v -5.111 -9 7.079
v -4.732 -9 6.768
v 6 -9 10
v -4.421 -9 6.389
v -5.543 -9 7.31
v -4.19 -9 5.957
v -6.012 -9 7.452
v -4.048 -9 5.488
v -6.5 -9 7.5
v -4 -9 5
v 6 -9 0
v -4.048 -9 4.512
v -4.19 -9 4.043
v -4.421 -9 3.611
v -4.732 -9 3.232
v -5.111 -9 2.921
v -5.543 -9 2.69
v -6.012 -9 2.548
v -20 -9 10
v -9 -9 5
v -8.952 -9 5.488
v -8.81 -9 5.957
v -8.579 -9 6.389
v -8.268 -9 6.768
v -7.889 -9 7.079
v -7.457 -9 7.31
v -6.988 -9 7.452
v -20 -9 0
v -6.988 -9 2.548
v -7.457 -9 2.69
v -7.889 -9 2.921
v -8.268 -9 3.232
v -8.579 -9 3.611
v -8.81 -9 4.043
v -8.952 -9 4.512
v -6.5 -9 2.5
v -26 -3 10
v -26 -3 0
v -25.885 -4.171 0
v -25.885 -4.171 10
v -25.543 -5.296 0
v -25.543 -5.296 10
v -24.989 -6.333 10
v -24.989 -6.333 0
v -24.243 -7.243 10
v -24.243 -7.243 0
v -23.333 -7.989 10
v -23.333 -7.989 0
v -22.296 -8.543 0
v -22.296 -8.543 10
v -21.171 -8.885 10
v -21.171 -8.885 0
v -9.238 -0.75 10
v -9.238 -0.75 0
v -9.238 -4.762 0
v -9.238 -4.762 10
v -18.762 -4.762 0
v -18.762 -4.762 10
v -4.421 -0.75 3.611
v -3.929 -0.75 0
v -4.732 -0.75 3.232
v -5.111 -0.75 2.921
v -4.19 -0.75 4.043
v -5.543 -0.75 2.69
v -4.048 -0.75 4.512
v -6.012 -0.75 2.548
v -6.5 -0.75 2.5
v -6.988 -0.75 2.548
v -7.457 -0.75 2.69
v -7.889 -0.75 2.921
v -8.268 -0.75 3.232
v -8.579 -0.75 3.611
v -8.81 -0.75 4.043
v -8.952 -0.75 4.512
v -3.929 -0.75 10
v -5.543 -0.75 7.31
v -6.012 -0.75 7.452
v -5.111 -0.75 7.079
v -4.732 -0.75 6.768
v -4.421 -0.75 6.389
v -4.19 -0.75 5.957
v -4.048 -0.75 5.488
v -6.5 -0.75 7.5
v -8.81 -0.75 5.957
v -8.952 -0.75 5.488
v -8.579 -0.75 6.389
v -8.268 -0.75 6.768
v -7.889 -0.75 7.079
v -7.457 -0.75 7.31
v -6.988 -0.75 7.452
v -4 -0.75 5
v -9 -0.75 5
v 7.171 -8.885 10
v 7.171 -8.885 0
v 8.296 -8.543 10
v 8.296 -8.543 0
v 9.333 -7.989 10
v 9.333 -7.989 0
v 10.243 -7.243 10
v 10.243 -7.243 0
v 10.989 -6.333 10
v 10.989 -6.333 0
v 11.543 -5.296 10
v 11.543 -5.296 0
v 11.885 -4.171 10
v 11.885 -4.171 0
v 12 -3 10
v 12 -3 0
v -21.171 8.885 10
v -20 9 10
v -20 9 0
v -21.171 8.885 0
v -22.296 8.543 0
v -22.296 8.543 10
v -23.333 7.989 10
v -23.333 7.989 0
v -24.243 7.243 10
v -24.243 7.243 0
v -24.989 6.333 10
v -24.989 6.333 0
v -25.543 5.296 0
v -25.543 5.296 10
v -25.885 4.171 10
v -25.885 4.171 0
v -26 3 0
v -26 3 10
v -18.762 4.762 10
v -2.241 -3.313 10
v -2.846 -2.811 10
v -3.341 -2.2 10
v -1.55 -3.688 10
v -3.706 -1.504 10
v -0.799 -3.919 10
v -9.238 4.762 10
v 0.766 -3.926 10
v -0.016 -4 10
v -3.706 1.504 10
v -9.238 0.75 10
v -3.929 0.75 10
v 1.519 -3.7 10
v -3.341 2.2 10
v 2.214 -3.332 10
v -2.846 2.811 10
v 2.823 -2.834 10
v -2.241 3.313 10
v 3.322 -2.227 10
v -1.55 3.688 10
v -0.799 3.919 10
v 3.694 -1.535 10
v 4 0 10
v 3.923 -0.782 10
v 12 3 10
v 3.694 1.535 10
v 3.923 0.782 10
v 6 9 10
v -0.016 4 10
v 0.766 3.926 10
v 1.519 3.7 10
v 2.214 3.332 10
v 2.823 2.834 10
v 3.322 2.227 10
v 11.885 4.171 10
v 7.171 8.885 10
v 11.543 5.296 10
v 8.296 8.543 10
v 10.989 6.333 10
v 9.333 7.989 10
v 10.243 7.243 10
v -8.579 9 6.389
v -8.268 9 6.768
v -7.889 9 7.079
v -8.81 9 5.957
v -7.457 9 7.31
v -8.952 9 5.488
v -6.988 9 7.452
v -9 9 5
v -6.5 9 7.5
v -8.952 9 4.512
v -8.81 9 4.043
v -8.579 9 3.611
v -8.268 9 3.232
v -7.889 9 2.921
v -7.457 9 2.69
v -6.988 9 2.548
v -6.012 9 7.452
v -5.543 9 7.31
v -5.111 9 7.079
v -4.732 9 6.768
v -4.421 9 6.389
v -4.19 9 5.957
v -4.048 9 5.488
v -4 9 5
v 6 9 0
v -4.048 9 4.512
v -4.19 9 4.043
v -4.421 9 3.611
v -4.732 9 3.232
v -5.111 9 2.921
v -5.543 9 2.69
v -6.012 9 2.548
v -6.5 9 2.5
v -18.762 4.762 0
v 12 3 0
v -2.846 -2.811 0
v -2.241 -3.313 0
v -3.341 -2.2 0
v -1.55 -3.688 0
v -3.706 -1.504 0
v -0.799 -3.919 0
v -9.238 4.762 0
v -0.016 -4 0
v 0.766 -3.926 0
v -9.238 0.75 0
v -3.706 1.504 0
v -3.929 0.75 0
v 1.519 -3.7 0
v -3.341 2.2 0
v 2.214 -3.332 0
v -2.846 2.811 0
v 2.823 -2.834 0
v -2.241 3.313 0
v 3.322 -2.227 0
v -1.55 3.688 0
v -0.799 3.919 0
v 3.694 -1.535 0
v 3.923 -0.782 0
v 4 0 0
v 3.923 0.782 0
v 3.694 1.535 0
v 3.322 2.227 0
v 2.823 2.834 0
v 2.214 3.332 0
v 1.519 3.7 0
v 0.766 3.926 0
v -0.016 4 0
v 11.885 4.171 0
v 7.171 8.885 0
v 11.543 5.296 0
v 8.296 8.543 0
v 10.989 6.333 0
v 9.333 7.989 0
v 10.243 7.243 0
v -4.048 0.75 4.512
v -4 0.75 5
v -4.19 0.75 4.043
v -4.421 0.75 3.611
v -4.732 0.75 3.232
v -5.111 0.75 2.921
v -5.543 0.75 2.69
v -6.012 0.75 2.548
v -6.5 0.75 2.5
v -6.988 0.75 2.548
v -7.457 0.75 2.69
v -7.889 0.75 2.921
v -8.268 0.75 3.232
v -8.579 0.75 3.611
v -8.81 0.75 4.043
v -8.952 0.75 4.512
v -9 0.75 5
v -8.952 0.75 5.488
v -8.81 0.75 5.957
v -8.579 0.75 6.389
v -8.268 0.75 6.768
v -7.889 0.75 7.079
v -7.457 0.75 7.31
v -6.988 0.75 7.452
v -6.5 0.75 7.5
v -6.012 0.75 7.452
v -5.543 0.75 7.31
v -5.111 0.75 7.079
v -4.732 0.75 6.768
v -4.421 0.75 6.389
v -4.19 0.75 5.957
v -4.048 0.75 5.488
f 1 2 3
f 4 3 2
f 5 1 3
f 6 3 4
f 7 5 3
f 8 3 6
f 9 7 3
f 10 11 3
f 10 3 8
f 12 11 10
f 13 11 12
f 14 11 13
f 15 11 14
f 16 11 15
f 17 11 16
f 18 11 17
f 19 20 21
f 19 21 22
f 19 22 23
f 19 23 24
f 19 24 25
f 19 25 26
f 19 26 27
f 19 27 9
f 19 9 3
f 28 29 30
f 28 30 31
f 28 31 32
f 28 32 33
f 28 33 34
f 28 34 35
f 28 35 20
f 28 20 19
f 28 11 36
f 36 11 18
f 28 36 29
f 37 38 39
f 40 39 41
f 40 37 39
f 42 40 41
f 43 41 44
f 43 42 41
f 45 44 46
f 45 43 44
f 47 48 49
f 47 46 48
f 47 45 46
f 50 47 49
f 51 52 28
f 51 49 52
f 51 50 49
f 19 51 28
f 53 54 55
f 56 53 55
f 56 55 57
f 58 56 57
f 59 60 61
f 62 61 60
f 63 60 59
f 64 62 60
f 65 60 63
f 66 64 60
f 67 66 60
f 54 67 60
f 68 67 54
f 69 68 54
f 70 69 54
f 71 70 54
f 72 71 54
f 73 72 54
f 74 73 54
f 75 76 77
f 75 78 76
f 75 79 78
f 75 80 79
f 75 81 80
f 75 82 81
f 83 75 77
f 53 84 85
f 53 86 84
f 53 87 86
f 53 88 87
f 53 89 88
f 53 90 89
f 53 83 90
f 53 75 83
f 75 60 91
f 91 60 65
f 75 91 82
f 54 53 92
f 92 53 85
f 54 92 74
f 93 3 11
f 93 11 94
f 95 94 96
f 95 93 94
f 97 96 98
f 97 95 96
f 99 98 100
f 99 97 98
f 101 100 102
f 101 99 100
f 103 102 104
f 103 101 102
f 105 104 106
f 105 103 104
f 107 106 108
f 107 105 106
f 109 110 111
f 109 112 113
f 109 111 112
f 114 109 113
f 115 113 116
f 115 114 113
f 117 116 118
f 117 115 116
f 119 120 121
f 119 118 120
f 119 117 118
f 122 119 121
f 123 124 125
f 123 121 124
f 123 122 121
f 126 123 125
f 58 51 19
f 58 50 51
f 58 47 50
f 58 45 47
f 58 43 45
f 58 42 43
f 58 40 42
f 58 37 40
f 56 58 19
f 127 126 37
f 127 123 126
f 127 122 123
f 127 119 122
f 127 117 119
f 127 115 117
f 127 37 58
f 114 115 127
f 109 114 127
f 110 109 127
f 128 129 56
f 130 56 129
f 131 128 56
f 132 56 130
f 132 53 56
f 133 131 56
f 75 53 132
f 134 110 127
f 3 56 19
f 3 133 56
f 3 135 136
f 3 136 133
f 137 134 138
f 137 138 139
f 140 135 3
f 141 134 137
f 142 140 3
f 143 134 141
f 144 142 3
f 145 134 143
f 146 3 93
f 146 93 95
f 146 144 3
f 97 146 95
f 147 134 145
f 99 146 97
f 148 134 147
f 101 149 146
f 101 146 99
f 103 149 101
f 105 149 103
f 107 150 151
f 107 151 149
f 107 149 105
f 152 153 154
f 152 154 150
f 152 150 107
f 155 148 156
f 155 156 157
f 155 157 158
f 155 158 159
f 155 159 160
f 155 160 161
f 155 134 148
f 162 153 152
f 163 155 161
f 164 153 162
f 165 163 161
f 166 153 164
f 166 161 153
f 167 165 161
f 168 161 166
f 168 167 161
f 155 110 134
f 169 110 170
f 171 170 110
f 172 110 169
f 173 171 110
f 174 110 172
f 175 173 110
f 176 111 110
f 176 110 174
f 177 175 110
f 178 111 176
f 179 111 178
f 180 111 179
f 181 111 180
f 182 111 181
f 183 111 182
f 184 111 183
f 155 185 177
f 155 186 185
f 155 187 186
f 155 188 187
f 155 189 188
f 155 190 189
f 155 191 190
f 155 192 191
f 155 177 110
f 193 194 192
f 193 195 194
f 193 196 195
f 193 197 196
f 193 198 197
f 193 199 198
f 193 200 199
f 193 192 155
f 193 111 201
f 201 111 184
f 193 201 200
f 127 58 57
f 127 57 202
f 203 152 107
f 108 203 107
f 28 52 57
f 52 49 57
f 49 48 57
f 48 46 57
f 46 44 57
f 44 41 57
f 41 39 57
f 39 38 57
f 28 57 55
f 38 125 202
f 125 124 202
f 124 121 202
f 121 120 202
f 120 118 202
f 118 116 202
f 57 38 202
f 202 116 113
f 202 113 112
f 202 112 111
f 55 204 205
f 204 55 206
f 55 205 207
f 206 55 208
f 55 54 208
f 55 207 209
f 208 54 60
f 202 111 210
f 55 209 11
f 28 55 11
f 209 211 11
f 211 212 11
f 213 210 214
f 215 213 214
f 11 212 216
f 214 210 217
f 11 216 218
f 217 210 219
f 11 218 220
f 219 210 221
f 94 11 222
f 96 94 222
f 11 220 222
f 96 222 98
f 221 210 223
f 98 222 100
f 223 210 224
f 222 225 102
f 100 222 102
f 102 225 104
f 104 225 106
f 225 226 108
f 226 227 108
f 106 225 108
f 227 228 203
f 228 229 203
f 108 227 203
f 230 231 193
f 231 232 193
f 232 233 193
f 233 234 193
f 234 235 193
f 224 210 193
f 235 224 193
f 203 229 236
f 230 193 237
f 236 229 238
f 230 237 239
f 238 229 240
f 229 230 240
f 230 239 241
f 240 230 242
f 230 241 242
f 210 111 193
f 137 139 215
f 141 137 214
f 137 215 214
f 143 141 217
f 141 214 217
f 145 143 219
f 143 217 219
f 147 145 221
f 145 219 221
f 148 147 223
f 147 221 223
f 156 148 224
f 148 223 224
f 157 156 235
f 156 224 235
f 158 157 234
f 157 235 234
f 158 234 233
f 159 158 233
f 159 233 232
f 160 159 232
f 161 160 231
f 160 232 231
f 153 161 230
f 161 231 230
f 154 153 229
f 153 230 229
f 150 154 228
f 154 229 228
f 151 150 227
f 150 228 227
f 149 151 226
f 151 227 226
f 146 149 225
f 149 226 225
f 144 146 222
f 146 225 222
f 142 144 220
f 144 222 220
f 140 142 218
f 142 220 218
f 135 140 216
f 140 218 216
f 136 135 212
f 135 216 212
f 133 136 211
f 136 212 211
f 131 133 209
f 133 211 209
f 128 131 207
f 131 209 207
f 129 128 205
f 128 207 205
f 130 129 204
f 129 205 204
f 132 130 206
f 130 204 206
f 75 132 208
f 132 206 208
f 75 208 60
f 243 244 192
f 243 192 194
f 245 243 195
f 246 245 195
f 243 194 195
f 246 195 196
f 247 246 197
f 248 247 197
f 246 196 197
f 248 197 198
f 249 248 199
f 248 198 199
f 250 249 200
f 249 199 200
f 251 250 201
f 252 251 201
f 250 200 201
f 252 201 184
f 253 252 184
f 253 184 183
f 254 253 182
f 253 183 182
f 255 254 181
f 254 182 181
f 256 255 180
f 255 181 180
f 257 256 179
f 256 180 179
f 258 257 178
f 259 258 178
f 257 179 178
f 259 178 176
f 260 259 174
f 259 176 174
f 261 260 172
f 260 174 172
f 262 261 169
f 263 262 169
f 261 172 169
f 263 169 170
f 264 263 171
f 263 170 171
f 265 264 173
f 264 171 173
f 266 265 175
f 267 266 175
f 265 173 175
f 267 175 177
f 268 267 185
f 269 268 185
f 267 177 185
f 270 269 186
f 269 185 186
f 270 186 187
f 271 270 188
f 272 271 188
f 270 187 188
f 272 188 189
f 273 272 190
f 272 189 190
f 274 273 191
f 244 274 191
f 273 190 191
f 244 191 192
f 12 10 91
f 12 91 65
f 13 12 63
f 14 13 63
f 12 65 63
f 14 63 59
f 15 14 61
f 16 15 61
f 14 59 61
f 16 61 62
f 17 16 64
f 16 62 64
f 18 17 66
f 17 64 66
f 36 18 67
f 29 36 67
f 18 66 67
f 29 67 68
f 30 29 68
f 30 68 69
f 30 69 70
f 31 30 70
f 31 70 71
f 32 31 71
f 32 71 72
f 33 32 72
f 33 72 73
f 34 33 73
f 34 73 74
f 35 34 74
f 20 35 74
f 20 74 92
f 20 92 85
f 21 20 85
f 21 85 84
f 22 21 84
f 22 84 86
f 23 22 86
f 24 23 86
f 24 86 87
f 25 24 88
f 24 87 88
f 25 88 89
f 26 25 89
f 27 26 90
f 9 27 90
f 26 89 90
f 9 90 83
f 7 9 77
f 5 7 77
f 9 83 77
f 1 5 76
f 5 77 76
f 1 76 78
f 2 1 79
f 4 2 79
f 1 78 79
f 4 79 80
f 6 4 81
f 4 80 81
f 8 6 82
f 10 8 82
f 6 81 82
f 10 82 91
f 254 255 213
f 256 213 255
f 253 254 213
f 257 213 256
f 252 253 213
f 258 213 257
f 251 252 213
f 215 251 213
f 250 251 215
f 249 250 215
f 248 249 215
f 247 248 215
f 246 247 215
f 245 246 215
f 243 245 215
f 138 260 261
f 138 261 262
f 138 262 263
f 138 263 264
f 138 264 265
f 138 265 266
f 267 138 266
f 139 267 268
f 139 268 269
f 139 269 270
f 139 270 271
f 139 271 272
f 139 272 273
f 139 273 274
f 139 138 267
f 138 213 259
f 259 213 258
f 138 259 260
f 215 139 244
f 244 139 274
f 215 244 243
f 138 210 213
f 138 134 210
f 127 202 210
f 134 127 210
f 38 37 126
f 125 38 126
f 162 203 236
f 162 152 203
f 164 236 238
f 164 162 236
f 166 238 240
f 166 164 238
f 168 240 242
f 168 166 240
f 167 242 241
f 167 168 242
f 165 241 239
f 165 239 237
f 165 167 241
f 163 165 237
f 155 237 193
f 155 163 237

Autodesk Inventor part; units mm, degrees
ref_plane "YZ Plane" through (0, 0, 0) normal (1, 0, 0) x (0, 1, 0)
ref_plane "XZ Plane" through (0, 0, 0) normal (0, 1, 0) x (-1, 0, 0)
ref_plane "XY Plane" through (0, 0, 0) normal (0, 0, 1) x (1, 0, 0)
sketch "Sketch1" plane through (0, 0, 0) normal (0, 0, 1) x (1, 0, 0)
  line L0 (0, 0) -> (-14, 0) construction
  circle A0 centre (-14, 0) radius 4
  circle A1 centre (0, 0) radius 4
  line L1 (12, -9) -> (-26, -9)
  line L2 (-26, -9) -> (-26, 9)
  line L3 (-26, 9) -> (12, 9)
  line L4 (12, 9) -> (12, -9)
  line L5 (12, -9) -> (-26, 9) construction
  line L6 (-26, -9) -> (12, 9) construction
  point P0 (-7, 0)
  dimension "d0" = 8
  dimension "d1" = 14
  dimension "d2" = 12
  dimension "d3" = 18
  dimension "d13" = 38
extrude "Extrusion1" add sketch "Sketch1" along normal blind 10
sketch "Sketch2" plane through (-26, 9, 0) normal (0, 1, 0) x (1, 0, 0)
  circle A0 centre (19.5, -5) radius 2.5
  line L0 (19.5, -5) -> (0, -5) construction
  line L1 (0, 0) -> (0, -10) construction
  point P0 (26, 0)
  dimension "d6" = 5
  dimension "d17" = 19.5
extrude "Extrusion2" cut sketch "Sketch2" against normal through all
fillet "Fillet1" radius 6 4 edges at (12, 9, 5) (-26, 9, 5) (-26, -9, 5) (12, -9, 5)
sketch "Sketch3" plane through (0, 0, 10) normal (0, 0, 1) x (1, 0, 0)
  line L0 (-20, -9) -> (6, -9) projected
  circle A0 centre (0, 0) radius 4 projected
  circle A1 centre (-14, 0) radius 4 projected
  line L1 (-14, 0) -> (0, 0) construction
  line L2 (0, -0.75) -> (-14, -0.75)
  line L3 (-14, -0.75) -> (-14, 0.75)
  line L4 (-14, 0.75) -> (0, 0.75)
  line L5 (0, 0.75) -> (0, -0.75)
  line L6 (0, -0.75) -> (-14, 0.75) construction
  line L7 (-14, -0.75) -> (0, 0.75) construction
  point P0 (-7, 0)
  dimension "d10" = 1.5
extrude "Extrusion3" cut sketch "Sketch3" against normal through all contours L4 L5 L2 A0 | A0 L2 A1 L4 | A1 L2 L3 L4 picked at (-1.3307, -0.0838) picked at (-12.6667, 0)
sketch "Sketch4" plane through (0, 0, 10) normal (0, 0, 1) x (1, 0, 0)
  line L0 (-10.0709, 0.75) -> (-3.9291, 0.75) construction
  arc A0 (-3.9291, -0.75) -> (-3.9291, 0.75) centre (0, 0) ccw construction
  line L1 (-3.9291, -0.75) -> (-10.0709, -0.75) construction
  arc A1 (-10.0709, 0.75) -> (-10.0709, -0.75) centre (-14, 0) ccw construction
  arc A2 (6, -9) -> (12, -3) centre (6, -3) ccw construction
  line L2 (12, -3) -> (12, 3) construction
  arc A3 (12, 3) -> (6, 9) centre (6, 3) ccw construction
  line L3 (6, 9) -> (-20, 9) construction
  arc A4 (-20, 9) -> (-26, 3) centre (-20, 3) ccw construction
  line L4 (-26, 3) -> (-26, -3) construction
  arc A5 (-26, -3) -> (-20, -9) centre (-20, -3) ccw construction
  line L5 (-20, -9) -> (6, -9) construction
  line L6 (-9.2375, -4.7625) -> (-18.7625, -4.7625)
  line L7 (-18.7625, -4.7625) -> (-18.7625, 4.7625)
  line L8 (-18.7625, 4.7625) -> (-9.2375, 4.7625)
  line L9 (-9.2375, 4.7625) -> (-9.2375, -4.7625)
  line L10 (-9.2375, -4.7625) -> (-18.7625, 4.7625) construction
  line L11 (-18.7625, -4.7625) -> (-9.2375, 4.7625) construction
  dimension "d14" = 9.525
extrude "Extrusion4" cut sketch "Sketch4" against normal through all
properties part number "crank web"
